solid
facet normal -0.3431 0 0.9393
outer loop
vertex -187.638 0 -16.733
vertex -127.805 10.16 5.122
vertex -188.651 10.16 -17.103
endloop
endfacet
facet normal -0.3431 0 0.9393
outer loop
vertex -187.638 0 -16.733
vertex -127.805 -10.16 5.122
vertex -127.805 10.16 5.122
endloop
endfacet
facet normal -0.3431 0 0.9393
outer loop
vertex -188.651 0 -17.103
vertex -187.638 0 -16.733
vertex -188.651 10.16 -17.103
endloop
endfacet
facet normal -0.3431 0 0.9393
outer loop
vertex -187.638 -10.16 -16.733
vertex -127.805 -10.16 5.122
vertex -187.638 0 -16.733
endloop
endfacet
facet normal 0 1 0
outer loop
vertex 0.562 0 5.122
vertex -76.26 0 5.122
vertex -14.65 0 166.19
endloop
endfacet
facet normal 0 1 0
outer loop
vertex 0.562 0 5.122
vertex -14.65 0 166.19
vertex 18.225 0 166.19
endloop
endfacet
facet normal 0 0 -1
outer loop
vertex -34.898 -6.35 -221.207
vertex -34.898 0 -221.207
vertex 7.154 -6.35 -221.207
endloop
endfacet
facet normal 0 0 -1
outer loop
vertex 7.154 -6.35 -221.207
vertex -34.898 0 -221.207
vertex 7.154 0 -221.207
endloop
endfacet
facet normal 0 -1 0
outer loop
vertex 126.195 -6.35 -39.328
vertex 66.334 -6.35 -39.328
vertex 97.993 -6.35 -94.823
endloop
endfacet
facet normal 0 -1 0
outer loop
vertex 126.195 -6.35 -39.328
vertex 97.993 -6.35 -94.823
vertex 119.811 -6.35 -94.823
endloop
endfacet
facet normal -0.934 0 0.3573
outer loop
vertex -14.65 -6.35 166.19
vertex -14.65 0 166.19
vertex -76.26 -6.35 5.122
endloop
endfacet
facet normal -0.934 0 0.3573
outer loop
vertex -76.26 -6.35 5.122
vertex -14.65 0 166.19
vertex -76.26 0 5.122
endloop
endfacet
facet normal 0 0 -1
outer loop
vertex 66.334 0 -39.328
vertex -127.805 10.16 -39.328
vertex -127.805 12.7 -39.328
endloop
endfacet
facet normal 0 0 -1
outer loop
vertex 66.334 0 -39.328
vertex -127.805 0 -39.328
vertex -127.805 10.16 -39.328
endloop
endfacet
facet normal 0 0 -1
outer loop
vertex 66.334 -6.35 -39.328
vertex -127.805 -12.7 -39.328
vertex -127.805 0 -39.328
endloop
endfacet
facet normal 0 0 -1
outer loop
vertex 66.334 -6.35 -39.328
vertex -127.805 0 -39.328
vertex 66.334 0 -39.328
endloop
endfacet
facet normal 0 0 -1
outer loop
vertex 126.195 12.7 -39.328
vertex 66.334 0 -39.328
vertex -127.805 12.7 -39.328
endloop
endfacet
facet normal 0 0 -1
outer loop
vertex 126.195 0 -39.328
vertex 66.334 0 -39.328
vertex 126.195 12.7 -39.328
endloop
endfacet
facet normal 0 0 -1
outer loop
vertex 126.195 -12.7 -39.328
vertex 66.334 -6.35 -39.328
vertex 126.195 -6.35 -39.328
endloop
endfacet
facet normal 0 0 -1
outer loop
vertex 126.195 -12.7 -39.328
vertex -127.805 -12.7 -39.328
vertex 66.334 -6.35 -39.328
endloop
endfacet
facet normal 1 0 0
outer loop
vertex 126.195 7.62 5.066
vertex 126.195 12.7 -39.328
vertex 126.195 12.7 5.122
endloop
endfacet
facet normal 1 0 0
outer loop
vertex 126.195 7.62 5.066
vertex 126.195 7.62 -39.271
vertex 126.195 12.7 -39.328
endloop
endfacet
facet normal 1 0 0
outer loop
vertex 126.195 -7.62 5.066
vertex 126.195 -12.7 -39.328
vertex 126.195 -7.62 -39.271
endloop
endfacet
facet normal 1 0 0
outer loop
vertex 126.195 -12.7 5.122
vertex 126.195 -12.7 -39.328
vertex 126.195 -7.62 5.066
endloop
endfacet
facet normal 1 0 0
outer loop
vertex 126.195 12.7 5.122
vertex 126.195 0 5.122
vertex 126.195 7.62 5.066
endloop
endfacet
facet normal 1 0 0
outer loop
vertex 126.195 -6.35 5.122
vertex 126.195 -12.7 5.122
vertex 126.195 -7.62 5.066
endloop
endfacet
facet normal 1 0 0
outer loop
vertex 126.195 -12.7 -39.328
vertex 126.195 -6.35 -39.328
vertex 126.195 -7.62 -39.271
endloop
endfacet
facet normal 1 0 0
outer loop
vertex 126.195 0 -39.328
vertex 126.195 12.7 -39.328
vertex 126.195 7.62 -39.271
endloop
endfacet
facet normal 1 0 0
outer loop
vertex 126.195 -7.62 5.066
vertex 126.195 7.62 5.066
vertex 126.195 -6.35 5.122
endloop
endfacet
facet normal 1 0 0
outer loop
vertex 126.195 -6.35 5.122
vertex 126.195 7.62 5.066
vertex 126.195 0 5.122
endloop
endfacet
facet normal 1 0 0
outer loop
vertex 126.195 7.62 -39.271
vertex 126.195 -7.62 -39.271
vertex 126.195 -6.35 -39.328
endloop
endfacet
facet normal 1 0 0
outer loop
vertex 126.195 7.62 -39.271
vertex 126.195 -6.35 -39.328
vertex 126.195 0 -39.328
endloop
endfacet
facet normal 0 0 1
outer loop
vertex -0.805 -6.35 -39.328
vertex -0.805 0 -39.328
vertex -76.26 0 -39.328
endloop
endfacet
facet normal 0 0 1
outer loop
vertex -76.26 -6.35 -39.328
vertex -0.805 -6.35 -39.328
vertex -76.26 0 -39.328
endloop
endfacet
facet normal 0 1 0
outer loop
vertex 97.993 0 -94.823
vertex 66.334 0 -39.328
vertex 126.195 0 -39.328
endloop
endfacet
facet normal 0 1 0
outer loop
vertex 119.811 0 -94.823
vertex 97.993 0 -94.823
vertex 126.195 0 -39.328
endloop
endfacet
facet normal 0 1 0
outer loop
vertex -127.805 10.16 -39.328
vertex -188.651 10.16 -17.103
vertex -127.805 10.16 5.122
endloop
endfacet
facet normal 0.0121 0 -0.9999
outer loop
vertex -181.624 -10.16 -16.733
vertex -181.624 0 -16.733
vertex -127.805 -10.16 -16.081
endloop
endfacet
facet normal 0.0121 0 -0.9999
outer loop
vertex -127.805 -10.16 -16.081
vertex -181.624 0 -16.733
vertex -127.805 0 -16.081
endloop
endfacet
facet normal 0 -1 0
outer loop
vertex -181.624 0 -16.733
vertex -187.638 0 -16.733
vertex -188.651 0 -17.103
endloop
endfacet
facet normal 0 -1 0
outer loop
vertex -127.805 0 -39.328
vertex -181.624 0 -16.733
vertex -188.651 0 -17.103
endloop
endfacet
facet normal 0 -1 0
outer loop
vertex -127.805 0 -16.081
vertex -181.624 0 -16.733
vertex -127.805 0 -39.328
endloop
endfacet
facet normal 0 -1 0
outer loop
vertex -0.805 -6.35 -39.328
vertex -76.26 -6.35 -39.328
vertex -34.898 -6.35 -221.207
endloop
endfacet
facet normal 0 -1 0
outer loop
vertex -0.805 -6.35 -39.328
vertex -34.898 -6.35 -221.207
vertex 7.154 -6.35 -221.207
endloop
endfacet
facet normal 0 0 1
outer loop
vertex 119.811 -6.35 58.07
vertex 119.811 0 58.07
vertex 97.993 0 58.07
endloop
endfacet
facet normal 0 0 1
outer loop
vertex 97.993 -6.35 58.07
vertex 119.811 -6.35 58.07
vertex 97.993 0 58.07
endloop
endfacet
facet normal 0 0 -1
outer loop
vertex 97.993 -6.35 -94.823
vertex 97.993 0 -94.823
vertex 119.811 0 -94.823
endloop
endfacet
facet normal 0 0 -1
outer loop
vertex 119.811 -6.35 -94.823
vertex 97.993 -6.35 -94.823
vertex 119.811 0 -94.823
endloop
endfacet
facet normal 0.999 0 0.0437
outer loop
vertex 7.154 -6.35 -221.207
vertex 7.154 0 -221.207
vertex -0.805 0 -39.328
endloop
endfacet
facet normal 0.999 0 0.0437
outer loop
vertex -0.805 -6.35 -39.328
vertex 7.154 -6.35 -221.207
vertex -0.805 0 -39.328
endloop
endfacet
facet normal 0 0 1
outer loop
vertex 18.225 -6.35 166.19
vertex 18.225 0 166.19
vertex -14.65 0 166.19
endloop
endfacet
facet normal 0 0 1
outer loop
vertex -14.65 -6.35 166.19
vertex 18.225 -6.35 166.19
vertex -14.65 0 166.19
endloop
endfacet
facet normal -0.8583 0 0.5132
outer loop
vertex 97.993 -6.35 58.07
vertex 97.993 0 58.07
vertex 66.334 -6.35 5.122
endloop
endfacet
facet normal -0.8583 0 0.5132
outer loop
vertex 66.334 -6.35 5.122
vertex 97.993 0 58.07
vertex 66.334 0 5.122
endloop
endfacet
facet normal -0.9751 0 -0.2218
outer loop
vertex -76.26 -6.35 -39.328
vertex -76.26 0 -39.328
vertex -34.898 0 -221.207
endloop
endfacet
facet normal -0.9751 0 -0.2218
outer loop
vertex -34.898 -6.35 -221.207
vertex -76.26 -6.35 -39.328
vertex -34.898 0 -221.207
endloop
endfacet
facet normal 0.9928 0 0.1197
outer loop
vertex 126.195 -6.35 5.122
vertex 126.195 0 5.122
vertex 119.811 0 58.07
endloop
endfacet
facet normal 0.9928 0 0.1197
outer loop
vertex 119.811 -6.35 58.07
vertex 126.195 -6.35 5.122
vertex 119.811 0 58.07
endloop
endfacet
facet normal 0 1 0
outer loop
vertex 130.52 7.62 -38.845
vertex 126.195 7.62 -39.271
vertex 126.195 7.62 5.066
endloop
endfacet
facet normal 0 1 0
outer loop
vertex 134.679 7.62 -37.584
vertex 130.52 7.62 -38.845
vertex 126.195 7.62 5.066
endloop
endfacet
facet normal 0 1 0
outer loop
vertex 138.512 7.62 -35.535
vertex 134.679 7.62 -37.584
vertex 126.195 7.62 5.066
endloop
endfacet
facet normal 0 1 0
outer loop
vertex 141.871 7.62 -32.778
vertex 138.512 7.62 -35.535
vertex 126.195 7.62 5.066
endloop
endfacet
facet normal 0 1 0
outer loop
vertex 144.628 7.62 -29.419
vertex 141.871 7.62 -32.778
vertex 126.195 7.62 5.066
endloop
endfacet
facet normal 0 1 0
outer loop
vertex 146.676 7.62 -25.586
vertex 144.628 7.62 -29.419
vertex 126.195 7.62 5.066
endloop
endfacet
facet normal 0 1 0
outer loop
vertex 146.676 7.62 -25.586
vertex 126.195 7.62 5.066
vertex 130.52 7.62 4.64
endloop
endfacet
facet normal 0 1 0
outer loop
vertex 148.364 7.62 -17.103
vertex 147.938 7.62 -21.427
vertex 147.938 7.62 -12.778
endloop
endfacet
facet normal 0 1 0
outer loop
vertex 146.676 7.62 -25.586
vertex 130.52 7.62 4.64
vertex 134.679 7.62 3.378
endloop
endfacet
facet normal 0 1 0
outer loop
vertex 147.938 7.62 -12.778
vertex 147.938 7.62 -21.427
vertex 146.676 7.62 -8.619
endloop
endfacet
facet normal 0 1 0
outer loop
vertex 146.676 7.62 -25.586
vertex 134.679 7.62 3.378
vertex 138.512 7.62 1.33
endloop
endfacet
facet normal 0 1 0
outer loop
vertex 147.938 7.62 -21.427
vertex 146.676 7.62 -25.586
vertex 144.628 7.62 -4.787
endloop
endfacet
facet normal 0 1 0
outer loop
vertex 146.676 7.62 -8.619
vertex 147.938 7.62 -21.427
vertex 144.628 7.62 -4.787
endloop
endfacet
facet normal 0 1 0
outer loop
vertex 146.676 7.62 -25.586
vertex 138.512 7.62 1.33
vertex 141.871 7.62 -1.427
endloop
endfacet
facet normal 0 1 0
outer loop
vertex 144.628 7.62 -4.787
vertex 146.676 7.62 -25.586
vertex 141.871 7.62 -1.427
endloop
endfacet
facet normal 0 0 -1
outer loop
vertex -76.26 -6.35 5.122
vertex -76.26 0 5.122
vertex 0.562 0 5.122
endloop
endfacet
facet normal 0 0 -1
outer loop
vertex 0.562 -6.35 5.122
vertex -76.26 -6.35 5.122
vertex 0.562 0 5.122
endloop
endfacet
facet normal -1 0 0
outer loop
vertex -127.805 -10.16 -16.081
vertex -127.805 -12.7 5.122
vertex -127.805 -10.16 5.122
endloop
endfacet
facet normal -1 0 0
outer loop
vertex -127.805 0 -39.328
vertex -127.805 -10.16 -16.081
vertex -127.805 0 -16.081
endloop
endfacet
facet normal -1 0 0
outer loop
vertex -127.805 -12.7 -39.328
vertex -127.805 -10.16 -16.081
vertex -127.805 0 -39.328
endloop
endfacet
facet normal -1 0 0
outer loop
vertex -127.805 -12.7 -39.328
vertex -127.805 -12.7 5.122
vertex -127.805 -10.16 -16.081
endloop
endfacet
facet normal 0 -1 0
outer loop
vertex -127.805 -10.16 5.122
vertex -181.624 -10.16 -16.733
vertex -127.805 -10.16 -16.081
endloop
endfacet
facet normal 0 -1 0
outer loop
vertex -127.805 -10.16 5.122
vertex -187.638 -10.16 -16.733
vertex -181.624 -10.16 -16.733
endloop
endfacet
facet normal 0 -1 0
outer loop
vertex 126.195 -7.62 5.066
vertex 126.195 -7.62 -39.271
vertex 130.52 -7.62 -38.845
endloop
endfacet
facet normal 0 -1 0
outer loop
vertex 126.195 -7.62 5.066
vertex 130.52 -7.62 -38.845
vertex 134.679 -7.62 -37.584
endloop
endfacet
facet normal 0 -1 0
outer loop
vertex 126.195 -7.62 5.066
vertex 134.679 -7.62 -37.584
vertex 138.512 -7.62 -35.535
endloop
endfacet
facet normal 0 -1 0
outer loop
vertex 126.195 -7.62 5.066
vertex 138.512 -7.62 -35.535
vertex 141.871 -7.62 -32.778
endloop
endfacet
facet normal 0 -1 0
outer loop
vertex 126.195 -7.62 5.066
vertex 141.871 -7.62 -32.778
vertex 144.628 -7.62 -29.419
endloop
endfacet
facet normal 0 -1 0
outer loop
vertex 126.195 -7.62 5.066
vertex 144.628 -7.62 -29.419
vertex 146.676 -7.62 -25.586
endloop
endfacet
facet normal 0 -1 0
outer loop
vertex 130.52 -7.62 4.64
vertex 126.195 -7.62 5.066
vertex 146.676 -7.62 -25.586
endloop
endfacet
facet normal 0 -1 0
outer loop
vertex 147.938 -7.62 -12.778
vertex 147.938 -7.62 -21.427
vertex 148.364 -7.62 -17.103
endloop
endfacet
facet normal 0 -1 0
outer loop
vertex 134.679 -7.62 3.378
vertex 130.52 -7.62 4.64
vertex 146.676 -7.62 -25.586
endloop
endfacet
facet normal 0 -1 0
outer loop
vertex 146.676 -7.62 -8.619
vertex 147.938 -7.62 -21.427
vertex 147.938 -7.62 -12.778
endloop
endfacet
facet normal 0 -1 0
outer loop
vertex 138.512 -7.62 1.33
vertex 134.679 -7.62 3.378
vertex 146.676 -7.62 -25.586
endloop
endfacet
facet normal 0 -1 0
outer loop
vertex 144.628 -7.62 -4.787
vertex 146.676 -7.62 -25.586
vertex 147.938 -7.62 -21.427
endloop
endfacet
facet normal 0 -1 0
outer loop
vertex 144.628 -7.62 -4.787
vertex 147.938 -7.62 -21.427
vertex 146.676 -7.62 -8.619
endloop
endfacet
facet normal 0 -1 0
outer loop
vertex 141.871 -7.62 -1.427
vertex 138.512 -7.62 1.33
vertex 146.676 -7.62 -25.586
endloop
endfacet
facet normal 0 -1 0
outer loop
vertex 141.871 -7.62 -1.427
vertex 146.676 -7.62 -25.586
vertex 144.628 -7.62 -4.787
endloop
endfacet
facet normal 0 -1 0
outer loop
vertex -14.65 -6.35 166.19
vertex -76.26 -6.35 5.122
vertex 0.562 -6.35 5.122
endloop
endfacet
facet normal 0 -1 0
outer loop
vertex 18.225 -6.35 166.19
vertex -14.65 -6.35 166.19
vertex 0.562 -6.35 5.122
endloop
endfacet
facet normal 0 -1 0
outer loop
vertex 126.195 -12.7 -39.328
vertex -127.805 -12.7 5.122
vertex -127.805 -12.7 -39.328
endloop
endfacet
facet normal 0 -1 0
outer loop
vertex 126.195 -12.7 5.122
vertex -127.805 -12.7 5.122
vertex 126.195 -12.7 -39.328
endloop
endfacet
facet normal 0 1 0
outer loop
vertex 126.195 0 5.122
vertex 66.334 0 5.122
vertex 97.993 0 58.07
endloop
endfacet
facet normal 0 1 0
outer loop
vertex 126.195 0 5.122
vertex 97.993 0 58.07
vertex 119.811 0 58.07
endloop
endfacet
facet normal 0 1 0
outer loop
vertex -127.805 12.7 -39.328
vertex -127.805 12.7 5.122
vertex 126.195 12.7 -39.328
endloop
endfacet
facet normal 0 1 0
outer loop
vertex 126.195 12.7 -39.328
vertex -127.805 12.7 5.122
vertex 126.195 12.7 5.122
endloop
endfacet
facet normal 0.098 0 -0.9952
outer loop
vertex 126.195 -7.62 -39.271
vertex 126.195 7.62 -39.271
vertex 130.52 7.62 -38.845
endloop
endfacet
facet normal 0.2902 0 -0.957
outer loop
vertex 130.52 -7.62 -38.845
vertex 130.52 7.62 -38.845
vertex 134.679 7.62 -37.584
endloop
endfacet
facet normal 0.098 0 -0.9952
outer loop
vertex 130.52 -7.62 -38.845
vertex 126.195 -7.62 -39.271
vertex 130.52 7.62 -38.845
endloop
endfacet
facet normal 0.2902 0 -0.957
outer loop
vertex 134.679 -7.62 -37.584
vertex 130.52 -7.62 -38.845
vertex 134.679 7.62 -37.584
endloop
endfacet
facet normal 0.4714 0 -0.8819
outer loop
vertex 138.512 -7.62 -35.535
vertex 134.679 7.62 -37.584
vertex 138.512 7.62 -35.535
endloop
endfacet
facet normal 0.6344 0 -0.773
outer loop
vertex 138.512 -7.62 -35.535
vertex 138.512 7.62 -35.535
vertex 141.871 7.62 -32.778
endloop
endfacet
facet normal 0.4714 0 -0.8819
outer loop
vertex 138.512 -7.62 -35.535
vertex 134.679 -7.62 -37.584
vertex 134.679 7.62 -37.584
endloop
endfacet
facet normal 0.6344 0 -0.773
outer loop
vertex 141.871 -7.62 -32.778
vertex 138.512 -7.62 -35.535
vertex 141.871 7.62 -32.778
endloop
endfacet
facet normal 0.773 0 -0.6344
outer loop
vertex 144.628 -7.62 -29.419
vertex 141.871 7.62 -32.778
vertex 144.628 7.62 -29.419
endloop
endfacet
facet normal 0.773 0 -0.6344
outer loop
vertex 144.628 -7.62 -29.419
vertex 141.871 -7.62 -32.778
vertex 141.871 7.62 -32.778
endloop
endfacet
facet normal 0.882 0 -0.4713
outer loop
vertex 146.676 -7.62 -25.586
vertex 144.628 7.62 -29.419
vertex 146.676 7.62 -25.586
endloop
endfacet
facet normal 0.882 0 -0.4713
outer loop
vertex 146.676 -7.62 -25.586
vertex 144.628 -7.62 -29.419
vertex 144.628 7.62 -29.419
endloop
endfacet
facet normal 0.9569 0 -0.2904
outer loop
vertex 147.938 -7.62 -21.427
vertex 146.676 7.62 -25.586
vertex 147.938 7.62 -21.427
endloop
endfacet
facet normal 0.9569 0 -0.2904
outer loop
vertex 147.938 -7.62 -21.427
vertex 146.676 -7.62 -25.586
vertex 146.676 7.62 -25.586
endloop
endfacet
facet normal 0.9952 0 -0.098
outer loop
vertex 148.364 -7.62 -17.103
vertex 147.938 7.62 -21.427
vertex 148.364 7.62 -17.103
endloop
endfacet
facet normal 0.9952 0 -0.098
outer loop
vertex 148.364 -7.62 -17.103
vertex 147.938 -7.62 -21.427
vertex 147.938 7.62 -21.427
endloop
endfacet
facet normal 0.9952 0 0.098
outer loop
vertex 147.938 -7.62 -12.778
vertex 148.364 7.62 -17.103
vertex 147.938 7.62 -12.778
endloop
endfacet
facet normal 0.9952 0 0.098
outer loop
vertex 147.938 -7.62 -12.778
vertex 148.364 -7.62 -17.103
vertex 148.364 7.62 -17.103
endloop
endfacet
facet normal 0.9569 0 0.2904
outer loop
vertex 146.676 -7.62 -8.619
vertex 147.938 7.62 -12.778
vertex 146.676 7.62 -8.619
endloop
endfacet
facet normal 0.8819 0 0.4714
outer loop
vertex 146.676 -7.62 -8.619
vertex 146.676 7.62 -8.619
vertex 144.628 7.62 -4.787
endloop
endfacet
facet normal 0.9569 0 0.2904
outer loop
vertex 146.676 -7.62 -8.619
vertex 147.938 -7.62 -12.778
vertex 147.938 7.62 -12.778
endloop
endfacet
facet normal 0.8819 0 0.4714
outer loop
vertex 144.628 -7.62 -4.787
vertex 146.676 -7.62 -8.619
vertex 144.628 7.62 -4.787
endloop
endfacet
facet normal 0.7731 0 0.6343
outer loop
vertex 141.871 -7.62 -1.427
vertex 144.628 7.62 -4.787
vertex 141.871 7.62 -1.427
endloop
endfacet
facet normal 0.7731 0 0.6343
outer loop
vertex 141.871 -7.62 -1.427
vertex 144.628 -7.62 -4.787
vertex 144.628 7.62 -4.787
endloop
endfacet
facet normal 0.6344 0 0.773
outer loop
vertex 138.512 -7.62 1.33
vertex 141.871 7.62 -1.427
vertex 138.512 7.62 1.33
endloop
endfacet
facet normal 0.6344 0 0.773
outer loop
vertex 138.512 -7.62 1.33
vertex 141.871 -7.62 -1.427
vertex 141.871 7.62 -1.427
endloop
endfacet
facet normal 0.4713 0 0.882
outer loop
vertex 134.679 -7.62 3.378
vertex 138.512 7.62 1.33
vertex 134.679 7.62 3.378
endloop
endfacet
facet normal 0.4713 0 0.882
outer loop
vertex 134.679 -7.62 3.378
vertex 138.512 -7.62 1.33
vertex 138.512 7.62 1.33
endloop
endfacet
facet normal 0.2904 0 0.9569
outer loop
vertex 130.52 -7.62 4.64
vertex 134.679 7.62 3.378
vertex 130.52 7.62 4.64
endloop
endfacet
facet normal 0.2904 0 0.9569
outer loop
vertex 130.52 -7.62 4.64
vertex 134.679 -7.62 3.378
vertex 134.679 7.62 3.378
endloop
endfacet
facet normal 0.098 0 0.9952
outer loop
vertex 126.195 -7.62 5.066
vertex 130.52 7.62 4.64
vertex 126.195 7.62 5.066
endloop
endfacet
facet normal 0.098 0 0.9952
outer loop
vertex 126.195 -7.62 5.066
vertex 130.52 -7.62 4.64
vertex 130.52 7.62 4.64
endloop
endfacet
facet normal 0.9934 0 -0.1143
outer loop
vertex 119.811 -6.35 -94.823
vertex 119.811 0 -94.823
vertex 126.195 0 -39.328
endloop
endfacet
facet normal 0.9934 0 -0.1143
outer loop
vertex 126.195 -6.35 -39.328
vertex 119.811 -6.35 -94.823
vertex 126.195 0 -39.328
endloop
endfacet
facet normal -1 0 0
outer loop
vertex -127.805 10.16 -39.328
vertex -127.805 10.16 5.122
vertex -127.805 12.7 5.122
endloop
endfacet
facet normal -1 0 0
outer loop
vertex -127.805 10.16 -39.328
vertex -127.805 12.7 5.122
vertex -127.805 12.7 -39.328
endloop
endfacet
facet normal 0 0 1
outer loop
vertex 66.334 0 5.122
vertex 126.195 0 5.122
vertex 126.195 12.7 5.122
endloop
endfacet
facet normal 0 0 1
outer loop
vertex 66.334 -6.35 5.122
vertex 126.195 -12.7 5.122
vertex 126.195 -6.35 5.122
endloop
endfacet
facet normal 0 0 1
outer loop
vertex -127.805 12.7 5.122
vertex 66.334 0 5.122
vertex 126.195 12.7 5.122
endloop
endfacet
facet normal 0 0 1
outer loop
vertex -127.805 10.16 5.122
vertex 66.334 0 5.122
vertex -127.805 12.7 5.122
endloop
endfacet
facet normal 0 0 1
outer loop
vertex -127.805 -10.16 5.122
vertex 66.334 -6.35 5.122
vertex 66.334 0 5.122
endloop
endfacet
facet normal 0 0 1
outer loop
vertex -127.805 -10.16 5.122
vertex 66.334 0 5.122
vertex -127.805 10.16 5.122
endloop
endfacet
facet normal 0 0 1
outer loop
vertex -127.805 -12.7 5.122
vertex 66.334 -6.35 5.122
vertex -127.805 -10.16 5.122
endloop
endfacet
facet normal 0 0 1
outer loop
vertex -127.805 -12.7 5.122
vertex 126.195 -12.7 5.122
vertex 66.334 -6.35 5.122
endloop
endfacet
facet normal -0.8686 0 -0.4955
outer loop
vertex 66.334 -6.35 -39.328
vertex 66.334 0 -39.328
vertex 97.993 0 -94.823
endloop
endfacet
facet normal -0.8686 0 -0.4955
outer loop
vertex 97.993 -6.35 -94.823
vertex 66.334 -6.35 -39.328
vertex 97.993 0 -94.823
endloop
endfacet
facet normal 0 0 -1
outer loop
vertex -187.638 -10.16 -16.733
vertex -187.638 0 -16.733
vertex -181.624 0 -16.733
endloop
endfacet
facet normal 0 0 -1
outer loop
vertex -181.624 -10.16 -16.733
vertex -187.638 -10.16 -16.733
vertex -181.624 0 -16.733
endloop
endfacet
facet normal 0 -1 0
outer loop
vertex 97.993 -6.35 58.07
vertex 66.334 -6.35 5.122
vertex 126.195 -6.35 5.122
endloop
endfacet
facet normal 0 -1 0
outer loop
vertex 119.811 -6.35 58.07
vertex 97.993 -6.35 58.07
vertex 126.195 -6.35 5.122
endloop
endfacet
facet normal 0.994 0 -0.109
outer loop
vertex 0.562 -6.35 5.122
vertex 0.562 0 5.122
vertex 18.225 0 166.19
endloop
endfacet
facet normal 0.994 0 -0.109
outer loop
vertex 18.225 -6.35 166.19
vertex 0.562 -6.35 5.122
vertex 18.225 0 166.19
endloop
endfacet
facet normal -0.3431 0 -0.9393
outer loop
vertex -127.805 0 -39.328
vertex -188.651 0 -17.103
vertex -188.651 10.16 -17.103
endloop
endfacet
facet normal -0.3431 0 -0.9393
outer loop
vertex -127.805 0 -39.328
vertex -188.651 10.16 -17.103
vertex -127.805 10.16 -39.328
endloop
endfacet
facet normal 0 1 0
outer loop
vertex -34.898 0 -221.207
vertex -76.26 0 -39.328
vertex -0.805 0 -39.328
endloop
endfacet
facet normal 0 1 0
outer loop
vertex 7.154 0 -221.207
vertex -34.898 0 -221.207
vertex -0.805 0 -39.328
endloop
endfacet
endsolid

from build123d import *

# Parameters (mm, degrees)
F1_DEPTH  = 6.35
F2_DEPTH  = 6.35
F3_DEPTH  = 12.7
F4_DEPTH  = 12.7
F5_DEPTH  = 6.35
F6_DEPTH  = 6.35
F7_DEPTH  = 12.7
F8_DEPTH  = 12.7
F9_DEPTH  = 7.62
F10_DEPTH = 7.62
F12_DEPTH = 10.16
F13_DEPTH = 10.16


with BuildPart() as f1:
    # F0 (on Front) → F1 (new body)
    with BuildSketch(Plane.XZ):
        Polygon((-14.650022611, 166.190251708), (-76.259791851, 5.1223636389), (0.5617379969, 5.1223636389), (18.2250589132, 166.190251708), align=None)
    extrude(amount=F1_DEPTH)


with BuildPart() as f2:
    # F0 (on Front) → F2 (new body)
    with BuildSketch(Plane.XZ):
        Polygon((-0.804517746, -39.3276363611), (-76.259791851, -39.3276363611), (-34.8977893591, -221.2072610855), (7.1541545913, -221.2072610855), align=None)
    extrude(amount=F2_DEPTH)


with BuildPart() as f3:
    # F0 (on Front) → F3 (new body)
    with BuildSketch(Plane.XZ):
        with BuildLine():
            Line((-127.804517746, 5.1223636389), (-127.804517746, -39.3276363611))
            Line((-127.804517746, -39.3276363611), (-76.259791851, -39.3276363611))
            Line((-76.259791851, -39.3276363611), (-0.804517746, -39.3276363611))
            Line((-0.804517746, -39.3276363611), (66.3339793682, -39.3276363611))
            Line((66.3339793682, -39.3276363611), (126.195482254, -39.3276363611))
            Line((126.195482254, -39.3276363611), (126.195482254, -39.2710786657))
            ThreePointArc((126.195482254, -39.2710786657), (104.0270399495, -17.1026363611), (126.195482254, 5.0658059434))
            Line((126.195482254, 5.0658059434), (126.195482254, 5.1223636389))
            Line((126.195482254, 5.1223636389), (66.3339793682, 5.1223636389))
            Line((66.3339793682, 5.1223636389), (0.5617379969, 5.1223636389))
            Line((0.5617379969, 5.1223636389), (-76.259791851, 5.1223636389))
            Line((-76.259791851, 5.1223636389), (-127.804517746, 5.1223636389))
        make_face()
    extrude(amount=F3_DEPTH)

    # F0 (on Front) → F4 (join)
    with BuildSketch(Plane.XZ):
        with BuildLine():
            Line((-127.804517746, 5.1223636389), (-127.804517746, -39.3276363611))
            Line((-127.804517746, -39.3276363611), (-76.259791851, -39.3276363611))
            Line((-76.259791851, -39.3276363611), (-0.804517746, -39.3276363611))
            Line((-0.804517746, -39.3276363611), (66.3339793682, -39.3276363611))
            Line((66.3339793682, -39.3276363611), (126.195482254, -39.3276363611))
            Line((126.195482254, -39.3276363611), (126.195482254, -39.2710786657))
            ThreePointArc((126.195482254, -39.2710786657), (104.0270399495, -17.1026363611), (126.195482254, 5.0658059434))
            Line((126.195482254, 5.0658059434), (126.195482254, 5.1223636389))
            Line((126.195482254, 5.1223636389), (66.3339793682, 5.1223636389))
            Line((66.3339793682, 5.1223636389), (0.5617379969, 5.1223636389))
            Line((0.5617379969, 5.1223636389), (-76.259791851, 5.1223636389))
            Line((-76.259791851, 5.1223636389), (-127.804517746, 5.1223636389))
        make_face()
    extrude(amount=-F4_DEPTH)

    # F0 (on Front) → F5 (join)
    with BuildSketch(Plane.XZ):
        Polygon((126.195482254, -39.3276363611), (66.3339793682, -39.3276363611), (97.9932621121, -94.8227718472), (119.8113709688, -94.8227718472), align=None)
    extrude(amount=F5_DEPTH)

    # F0 (on Front) → F6 (join)
    with BuildSketch(Plane.XZ):
        Polygon((97.9932621121, 58.0698437989), (66.3339793682, 5.1223636389), (126.195482254, 5.1223636389), (119.8113709688, 58.0698437989), align=None)
    extrude(amount=F6_DEPTH)

    # F0 (on Front) → F7 (join)
    with BuildSketch(Plane.XZ):
        with BuildLine():
            ThreePointArc((126.195482254, 5.0658059434), (104.0270399495, -17.1026363611), (126.195482254, -39.2710786657))
            Line((126.195482254, -39.2710786657), (126.195482254, 5.0658059434))
        make_face()
    extrude(amount=F7_DEPTH)

    # F0 (on Front) → F8 (join)
    with BuildSketch(Plane.XZ):
        with BuildLine():
            ThreePointArc((126.195482254, 5.0658059434), (104.0270399495, -17.1026363611), (126.195482254, -39.2710786657))
            Line((126.195482254, -39.2710786657), (126.195482254, 5.0658059434))
        make_face()
    extrude(amount=-F8_DEPTH)

    # F0 (on Front) → F9 (join)
    with BuildSketch(Plane.XZ):
        with BuildLine():
            Line((126.195482254, 5.0658059434), (126.195482254, -39.2710786657))
            ThreePointArc((126.195482254, -39.2710786657), (141.8709381359, -32.778092243), (148.3639245586, -17.1026363611))
            ThreePointArc((148.3639245586, -17.1026363611), (141.8709381359, -1.4271804792), (126.195482254, 5.0658059434))
        make_face()
    extrude(amount=F9_DEPTH)

    # F0 (on Front) → F10 (join)
    with BuildSketch(Plane.XZ):
        with BuildLine():
            Line((126.195482254, 5.0658059434), (126.195482254, -39.2710786657))
            ThreePointArc((126.195482254, -39.2710786657), (141.8709381359, -32.778092243), (148.3639245586, -17.1026363611))
            ThreePointArc((148.3639245586, -17.1026363611), (141.8709381359, -1.4271804792), (126.195482254, 5.0658059434))
        make_face()
    extrude(amount=-F10_DEPTH)

    # F11 (on face) → F12 (join)
    with BuildSketch(Plane.XZ):
        Polygon((-127.804517746, 5.1223636389), (-187.6378862633, -16.7326647788), (-181.624352932, -16.7326647788), (-127.804517746, -16.0813909283), align=None)
    extrude(amount=F12_DEPTH)

    # F0 (on Front) → F13 (join)
    with BuildSketch(Plane.XZ):
        Polygon((-188.6507719755, -17.1026363611), (-127.804517746, -39.3276363611), (-127.804517746, 5.1223636389), align=None)
    extrude(amount=-F13_DEPTH)


solid = Compound([f1.part, f2.part, f3.part])
